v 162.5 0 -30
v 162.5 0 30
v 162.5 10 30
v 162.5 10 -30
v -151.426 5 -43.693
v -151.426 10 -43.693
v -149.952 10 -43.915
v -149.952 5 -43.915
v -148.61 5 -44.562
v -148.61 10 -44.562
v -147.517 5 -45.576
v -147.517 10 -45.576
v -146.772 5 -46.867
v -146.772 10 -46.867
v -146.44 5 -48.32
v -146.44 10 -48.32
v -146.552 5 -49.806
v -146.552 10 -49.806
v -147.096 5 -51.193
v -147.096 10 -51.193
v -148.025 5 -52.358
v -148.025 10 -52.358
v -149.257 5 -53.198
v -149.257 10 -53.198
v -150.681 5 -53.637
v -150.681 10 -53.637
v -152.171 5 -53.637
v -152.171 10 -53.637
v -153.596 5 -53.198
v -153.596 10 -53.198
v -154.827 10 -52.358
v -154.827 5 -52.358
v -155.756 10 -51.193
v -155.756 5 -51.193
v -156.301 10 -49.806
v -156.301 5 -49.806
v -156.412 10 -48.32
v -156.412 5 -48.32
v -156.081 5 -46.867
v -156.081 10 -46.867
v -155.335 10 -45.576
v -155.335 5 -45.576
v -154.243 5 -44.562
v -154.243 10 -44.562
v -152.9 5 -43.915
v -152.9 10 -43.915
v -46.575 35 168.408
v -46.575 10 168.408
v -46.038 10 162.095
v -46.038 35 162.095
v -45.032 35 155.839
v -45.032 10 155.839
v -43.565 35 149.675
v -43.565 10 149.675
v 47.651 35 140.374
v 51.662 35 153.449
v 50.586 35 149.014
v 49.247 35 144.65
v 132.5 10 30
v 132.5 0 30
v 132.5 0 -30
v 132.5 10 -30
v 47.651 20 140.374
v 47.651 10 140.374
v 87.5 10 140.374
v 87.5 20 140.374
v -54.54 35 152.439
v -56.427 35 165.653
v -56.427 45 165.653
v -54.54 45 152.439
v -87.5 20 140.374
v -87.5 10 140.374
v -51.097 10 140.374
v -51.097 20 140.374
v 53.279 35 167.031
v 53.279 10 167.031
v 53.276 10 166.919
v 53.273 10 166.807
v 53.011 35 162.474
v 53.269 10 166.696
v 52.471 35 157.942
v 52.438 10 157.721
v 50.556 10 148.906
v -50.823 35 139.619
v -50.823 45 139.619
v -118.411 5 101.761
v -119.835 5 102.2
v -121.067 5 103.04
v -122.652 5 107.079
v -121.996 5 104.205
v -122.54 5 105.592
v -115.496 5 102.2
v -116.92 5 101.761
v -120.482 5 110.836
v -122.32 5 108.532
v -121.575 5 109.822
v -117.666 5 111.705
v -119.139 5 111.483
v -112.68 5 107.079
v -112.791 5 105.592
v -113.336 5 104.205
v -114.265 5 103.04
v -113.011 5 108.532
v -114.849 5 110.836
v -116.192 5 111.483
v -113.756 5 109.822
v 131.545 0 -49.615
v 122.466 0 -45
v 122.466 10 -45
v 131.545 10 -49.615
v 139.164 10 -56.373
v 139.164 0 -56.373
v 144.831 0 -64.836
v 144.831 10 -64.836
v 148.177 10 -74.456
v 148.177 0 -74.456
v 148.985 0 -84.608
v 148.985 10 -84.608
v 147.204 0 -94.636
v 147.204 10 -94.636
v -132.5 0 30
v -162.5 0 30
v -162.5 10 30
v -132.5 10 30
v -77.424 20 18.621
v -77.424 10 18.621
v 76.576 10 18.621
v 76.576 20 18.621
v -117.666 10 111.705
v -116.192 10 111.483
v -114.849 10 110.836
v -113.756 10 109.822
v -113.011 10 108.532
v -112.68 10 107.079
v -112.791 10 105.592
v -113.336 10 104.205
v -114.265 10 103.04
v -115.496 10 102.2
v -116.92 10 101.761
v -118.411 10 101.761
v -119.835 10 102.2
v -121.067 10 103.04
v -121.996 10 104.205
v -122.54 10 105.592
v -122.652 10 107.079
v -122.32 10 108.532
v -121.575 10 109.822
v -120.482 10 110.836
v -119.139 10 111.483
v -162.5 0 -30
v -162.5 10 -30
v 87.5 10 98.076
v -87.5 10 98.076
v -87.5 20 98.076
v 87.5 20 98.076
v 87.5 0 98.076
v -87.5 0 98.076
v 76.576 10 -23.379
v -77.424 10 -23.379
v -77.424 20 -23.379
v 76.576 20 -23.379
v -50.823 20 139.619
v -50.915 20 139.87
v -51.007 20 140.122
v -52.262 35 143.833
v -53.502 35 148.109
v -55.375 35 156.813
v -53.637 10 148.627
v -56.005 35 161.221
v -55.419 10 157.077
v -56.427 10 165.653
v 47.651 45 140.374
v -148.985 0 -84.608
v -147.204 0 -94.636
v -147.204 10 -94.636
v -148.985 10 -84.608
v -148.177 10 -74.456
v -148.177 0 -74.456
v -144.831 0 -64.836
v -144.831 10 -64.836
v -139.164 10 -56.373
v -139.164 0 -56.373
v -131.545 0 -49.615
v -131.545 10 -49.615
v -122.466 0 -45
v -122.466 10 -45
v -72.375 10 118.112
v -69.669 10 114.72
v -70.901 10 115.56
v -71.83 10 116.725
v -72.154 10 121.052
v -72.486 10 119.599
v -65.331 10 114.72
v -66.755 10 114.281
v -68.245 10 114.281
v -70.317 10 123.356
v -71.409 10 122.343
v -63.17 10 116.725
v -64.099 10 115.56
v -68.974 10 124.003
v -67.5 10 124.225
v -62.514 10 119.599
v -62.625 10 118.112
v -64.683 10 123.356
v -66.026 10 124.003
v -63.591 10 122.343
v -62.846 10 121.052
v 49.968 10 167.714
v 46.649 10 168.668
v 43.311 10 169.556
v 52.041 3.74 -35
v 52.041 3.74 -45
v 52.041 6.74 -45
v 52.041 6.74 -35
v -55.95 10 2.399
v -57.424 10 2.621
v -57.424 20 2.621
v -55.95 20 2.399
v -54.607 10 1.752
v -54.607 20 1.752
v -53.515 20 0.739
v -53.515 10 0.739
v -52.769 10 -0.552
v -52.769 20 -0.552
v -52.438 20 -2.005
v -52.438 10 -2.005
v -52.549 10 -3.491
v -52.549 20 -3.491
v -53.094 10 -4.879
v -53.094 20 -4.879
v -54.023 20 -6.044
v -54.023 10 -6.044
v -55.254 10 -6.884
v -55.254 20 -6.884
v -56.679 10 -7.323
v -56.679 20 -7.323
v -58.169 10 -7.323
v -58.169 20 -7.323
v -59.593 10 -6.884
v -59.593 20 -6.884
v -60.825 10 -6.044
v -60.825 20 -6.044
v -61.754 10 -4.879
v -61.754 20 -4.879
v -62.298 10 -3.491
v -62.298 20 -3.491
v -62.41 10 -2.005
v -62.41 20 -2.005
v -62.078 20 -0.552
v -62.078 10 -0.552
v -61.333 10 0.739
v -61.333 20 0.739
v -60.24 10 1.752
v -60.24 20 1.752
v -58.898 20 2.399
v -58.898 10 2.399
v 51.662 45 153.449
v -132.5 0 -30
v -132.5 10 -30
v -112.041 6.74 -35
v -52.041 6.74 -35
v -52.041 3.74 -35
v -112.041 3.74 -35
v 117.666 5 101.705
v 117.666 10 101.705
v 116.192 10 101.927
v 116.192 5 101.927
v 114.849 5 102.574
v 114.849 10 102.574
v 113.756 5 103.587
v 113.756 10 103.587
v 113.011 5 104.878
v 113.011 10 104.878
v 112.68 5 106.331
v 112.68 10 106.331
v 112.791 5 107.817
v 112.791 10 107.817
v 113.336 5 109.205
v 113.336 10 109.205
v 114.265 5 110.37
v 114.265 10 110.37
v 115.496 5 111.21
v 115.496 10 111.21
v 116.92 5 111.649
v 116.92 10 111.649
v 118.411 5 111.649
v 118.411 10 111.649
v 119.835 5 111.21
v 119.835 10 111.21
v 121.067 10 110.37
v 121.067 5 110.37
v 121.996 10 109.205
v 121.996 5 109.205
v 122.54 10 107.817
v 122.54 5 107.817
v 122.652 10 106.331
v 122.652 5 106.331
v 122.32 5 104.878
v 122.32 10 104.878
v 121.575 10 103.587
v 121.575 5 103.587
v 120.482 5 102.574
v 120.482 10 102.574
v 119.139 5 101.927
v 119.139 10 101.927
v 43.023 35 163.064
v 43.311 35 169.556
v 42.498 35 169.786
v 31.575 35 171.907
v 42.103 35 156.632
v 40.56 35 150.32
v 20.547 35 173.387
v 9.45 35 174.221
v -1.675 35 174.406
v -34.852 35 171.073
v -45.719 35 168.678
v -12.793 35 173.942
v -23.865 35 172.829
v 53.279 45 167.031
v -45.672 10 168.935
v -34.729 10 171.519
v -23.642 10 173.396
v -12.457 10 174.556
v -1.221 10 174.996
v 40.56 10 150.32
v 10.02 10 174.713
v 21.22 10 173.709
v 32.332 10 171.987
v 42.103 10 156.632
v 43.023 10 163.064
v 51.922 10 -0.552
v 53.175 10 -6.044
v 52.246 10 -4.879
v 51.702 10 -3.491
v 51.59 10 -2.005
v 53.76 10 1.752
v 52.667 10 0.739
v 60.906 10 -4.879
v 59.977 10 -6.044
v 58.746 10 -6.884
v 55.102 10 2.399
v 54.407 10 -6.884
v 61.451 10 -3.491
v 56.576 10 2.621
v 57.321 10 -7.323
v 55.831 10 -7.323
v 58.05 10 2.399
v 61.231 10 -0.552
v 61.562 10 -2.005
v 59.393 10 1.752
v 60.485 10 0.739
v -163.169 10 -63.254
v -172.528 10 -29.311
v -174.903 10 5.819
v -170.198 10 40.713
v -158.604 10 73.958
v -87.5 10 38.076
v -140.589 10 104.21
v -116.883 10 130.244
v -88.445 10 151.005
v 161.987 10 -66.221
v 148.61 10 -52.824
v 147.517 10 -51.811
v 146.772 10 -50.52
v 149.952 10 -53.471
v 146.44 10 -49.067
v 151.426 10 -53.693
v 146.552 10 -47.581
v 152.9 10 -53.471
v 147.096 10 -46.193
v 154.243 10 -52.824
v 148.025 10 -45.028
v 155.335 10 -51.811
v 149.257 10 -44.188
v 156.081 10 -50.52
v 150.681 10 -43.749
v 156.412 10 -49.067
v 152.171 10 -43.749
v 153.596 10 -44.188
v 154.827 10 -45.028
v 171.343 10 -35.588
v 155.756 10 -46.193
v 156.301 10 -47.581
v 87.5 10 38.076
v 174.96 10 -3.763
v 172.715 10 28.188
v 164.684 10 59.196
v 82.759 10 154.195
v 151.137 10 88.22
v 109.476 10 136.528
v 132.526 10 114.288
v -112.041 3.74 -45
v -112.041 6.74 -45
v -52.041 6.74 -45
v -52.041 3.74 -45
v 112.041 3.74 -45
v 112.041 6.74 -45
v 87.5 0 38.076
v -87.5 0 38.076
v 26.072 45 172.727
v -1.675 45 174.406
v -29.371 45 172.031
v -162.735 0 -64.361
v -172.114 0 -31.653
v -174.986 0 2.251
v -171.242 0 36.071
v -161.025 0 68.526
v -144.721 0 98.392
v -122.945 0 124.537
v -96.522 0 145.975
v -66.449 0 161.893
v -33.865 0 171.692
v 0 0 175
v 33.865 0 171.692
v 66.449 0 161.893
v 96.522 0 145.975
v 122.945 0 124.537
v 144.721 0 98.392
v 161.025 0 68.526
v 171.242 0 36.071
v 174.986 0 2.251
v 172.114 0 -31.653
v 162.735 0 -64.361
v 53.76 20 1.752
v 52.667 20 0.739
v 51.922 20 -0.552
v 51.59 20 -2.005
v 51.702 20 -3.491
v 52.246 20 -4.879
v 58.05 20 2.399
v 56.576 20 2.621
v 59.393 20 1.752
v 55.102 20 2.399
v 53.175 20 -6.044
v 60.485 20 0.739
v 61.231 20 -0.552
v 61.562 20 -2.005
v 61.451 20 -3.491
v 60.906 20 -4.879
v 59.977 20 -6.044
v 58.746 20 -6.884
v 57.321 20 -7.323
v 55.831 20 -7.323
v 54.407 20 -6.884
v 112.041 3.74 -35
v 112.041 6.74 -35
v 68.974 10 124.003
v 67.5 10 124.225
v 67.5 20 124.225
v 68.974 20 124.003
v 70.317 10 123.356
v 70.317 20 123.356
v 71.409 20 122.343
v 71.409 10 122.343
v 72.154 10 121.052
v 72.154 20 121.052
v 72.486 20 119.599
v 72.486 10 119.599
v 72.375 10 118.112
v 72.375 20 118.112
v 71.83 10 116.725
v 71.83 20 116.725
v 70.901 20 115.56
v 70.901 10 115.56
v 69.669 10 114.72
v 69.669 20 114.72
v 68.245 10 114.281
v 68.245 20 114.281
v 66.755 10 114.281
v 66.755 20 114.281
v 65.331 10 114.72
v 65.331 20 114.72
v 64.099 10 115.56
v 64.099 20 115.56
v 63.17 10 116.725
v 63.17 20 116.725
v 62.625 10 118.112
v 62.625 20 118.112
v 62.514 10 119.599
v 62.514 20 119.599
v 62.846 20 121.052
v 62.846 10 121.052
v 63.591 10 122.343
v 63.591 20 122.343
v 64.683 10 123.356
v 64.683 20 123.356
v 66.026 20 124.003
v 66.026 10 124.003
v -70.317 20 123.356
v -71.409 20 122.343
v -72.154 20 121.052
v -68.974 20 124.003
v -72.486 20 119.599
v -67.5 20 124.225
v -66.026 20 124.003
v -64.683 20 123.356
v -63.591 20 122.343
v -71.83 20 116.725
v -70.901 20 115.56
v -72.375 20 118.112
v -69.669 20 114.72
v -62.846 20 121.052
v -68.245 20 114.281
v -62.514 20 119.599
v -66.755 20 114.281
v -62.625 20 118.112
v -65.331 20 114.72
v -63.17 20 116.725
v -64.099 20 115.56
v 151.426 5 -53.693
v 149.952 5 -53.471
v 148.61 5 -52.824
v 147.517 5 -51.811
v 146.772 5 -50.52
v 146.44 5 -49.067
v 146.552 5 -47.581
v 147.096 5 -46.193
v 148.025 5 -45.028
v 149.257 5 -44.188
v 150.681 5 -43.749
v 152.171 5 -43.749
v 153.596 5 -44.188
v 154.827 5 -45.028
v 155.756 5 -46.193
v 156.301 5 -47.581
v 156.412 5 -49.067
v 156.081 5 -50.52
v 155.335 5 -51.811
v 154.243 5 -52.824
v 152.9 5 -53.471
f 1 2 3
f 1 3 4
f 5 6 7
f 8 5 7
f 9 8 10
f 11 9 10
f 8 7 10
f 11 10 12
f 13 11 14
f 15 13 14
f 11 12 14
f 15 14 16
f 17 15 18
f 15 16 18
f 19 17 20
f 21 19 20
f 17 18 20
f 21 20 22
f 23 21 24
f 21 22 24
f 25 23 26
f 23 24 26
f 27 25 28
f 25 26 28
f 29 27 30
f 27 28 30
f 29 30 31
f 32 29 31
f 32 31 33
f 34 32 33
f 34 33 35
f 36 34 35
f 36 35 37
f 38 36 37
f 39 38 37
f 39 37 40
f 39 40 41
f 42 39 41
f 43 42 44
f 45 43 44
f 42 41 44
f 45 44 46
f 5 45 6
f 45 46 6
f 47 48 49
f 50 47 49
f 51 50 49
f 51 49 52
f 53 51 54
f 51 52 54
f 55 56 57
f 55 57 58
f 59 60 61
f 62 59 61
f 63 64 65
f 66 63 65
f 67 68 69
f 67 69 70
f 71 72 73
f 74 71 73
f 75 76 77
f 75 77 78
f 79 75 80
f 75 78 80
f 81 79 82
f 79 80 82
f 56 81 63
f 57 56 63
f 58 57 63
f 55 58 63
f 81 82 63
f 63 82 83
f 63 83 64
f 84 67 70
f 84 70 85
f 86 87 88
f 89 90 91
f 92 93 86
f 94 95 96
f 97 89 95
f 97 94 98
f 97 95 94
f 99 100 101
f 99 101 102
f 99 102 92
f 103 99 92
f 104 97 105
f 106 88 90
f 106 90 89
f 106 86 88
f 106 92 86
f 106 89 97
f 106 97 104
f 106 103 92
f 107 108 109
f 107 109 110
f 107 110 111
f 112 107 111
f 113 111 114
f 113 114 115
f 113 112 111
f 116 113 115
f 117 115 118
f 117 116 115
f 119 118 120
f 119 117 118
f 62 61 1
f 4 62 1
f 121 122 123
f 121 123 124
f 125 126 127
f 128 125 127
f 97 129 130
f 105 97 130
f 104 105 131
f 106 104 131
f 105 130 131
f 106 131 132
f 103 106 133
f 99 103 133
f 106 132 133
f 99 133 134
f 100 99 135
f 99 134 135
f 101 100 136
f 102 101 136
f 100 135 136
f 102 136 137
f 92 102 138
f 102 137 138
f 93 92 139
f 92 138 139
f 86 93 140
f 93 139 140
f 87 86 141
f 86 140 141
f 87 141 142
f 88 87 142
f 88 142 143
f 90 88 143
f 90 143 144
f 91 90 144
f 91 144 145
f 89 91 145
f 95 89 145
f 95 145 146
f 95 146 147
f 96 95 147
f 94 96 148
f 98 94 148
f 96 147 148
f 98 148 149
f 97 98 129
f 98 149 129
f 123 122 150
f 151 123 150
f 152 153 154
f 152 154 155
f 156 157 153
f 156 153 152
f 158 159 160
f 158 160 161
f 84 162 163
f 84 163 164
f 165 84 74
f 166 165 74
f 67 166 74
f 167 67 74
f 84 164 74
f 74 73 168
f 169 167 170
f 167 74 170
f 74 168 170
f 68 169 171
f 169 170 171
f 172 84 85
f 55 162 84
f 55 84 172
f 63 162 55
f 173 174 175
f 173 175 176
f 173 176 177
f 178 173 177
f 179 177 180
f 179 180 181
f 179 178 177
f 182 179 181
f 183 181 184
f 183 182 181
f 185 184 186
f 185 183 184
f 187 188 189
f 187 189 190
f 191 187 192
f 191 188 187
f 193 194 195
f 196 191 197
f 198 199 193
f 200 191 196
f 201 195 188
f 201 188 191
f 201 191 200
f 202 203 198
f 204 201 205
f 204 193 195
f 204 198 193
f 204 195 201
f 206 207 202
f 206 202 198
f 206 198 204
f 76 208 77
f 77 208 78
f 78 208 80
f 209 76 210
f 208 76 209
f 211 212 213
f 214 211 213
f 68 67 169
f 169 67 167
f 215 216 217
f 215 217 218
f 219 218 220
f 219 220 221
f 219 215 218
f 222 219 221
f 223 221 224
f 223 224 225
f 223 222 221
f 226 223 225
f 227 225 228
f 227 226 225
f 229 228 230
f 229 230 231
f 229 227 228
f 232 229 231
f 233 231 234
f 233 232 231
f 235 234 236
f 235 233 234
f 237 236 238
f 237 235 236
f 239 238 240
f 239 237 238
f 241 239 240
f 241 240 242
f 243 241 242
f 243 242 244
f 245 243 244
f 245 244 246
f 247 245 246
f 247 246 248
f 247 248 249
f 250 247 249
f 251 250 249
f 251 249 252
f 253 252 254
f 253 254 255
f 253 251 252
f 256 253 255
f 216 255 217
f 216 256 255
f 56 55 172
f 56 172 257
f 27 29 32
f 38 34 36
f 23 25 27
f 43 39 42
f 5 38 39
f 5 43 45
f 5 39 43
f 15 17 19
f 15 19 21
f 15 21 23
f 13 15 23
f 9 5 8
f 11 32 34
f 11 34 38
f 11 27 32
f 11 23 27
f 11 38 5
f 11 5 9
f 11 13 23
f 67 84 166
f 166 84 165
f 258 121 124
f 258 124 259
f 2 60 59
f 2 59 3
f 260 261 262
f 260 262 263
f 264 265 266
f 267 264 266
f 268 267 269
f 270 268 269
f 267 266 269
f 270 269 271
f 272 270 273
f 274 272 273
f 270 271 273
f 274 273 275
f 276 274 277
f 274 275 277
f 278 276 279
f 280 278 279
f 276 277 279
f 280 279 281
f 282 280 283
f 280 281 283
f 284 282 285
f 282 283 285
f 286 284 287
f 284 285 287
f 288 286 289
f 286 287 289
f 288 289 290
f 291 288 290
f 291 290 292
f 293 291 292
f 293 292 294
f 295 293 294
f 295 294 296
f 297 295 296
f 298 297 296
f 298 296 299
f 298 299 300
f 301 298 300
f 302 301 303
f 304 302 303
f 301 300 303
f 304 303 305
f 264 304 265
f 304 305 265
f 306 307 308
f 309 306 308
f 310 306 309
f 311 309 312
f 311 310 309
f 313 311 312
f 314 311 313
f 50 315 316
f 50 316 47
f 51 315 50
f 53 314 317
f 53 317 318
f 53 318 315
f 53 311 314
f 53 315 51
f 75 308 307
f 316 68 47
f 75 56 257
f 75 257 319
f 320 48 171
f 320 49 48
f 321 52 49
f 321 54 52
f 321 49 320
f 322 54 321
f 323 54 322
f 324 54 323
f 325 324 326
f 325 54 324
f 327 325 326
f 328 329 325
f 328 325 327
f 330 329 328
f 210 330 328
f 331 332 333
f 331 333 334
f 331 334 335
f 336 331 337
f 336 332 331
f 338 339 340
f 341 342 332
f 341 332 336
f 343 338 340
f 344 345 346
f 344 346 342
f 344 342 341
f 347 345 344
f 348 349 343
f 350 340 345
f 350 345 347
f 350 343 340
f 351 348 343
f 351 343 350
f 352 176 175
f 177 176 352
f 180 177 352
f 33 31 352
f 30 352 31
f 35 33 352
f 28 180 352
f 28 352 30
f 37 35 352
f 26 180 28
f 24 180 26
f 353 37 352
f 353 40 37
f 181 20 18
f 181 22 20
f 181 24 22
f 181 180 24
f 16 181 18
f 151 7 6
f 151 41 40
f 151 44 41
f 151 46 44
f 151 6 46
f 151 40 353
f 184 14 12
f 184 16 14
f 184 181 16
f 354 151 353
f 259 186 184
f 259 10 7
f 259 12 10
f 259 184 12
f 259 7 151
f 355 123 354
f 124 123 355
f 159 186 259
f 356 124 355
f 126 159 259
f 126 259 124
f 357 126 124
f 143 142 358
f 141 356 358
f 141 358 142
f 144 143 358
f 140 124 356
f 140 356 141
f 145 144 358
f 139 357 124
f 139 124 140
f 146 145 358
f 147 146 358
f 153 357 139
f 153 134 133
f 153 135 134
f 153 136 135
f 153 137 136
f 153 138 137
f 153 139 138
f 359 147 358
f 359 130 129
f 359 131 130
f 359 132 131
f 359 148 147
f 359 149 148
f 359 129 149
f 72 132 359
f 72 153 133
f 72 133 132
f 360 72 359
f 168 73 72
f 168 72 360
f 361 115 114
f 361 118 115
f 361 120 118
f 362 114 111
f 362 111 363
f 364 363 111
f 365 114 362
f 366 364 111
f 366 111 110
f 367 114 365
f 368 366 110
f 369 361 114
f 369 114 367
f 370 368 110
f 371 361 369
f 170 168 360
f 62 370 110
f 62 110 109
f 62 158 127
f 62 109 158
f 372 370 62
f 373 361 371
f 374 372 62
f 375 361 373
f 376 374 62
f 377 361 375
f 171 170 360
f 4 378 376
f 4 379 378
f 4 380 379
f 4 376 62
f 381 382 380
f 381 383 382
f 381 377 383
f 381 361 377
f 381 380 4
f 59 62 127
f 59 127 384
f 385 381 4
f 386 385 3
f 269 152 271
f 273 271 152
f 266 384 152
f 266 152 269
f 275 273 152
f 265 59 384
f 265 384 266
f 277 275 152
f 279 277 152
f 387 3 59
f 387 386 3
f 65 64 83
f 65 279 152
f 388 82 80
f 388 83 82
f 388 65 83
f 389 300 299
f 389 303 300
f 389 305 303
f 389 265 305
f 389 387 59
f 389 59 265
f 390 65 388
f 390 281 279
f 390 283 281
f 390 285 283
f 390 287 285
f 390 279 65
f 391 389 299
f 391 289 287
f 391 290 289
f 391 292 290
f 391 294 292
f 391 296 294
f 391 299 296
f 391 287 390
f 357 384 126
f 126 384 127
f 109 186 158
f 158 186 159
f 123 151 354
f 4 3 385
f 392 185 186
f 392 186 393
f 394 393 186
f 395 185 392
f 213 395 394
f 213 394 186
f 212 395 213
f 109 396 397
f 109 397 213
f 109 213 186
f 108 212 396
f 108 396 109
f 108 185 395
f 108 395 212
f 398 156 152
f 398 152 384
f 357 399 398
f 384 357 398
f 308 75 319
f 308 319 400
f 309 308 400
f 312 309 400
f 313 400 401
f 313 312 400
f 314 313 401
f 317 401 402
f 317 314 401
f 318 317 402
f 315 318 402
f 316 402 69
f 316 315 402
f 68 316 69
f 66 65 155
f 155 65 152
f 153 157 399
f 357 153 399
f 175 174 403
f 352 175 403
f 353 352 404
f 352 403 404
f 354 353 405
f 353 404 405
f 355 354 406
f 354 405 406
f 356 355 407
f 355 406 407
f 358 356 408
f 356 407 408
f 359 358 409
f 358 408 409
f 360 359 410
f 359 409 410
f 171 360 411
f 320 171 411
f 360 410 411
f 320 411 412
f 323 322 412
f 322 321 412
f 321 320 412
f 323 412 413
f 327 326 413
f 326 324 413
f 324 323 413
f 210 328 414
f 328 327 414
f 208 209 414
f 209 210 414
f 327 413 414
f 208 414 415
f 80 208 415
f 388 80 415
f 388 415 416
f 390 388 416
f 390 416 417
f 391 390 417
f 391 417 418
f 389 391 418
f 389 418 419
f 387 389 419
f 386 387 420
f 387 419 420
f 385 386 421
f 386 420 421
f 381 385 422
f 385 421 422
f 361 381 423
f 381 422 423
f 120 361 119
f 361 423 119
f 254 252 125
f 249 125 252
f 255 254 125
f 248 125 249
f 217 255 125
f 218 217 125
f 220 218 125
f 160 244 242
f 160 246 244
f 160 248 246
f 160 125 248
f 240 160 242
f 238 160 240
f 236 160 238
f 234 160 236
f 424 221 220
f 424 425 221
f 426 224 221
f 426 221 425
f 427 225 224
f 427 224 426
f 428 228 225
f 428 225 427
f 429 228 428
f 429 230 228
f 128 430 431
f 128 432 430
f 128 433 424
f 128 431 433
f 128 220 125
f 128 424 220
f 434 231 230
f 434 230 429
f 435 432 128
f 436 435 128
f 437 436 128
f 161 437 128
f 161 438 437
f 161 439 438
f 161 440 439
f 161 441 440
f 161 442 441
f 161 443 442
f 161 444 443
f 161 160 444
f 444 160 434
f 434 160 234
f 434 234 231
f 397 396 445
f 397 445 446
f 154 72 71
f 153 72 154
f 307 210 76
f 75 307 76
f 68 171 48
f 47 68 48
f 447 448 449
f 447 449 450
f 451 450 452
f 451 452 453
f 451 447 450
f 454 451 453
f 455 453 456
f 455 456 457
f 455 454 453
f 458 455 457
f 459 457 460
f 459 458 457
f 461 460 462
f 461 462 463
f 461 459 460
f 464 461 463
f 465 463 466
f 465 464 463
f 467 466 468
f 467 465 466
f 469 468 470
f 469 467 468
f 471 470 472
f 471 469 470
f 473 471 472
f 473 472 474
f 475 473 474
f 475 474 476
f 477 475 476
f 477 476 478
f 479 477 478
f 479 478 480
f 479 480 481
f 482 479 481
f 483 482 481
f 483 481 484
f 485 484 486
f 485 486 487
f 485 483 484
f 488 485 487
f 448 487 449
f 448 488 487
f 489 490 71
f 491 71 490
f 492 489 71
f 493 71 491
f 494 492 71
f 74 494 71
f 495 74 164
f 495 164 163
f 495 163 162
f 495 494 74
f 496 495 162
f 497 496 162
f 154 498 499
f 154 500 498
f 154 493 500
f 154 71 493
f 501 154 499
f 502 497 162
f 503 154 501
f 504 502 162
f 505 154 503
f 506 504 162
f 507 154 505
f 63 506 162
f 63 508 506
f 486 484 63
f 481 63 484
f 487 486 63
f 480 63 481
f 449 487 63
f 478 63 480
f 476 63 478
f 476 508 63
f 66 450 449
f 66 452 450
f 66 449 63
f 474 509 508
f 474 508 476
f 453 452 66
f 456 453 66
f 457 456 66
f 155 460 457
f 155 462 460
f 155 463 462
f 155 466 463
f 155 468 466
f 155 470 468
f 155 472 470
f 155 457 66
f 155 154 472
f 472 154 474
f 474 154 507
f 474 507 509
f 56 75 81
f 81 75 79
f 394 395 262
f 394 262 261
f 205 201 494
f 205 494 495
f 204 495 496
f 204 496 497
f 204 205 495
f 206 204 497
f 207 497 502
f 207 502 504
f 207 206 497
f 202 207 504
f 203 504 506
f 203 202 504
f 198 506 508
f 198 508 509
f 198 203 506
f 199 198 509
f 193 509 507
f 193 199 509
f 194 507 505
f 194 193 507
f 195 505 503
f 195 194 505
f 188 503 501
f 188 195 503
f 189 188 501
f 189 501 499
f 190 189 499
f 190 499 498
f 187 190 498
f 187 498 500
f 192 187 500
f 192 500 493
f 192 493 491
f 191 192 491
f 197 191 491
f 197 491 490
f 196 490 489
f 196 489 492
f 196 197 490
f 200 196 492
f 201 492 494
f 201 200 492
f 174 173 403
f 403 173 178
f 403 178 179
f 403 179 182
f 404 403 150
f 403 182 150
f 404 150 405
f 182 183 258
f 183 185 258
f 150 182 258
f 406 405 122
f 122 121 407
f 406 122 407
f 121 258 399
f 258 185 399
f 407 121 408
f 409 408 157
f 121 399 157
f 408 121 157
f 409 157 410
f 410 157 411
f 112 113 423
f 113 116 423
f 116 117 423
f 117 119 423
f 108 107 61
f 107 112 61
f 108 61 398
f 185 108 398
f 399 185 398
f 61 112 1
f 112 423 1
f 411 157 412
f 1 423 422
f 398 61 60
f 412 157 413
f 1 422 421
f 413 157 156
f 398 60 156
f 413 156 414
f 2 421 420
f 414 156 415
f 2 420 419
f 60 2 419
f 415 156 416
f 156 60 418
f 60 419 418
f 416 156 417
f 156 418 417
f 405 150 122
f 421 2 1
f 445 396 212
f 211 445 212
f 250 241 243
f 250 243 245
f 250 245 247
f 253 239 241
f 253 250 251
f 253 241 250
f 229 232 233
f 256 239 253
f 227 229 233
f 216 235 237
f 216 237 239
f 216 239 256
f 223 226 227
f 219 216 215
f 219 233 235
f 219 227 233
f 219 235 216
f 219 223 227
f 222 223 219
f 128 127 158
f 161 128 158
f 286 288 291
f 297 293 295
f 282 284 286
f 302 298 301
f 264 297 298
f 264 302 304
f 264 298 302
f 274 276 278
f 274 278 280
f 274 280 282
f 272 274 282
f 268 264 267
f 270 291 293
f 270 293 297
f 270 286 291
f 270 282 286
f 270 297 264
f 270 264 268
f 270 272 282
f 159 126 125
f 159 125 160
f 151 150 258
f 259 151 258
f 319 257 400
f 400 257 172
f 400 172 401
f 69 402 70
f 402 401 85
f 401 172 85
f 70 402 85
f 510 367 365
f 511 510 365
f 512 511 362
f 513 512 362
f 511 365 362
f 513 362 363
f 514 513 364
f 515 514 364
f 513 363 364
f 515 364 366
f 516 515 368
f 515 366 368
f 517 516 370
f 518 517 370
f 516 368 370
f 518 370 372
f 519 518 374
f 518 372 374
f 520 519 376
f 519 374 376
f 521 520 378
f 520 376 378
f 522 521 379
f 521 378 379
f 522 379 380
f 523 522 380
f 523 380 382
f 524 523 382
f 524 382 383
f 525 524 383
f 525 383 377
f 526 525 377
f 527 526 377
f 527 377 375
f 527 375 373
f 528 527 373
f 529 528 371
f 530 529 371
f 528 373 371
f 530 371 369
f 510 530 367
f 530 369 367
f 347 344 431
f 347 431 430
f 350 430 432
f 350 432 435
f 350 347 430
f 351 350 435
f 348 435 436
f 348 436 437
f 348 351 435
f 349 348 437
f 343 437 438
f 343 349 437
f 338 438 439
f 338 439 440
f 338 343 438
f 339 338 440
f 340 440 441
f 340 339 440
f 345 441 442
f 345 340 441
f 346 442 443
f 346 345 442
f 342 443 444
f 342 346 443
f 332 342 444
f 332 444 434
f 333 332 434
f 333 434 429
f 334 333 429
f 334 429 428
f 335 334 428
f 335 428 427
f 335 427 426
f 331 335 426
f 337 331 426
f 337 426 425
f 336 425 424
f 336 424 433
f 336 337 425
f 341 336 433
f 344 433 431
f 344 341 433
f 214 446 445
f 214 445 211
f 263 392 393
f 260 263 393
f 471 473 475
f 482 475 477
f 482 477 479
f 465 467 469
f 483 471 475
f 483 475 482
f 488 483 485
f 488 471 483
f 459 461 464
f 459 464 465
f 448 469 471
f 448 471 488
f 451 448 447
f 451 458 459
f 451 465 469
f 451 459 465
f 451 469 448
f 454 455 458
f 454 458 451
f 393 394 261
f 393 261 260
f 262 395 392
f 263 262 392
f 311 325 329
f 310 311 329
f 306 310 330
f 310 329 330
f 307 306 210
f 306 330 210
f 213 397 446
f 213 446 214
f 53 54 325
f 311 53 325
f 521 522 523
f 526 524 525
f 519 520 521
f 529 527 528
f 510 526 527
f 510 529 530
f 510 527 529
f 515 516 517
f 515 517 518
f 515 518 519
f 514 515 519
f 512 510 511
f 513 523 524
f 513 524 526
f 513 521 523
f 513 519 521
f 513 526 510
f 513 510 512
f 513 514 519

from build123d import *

# Parameters (mm, degrees)
BASEDIA_R           = 175
BOSS_EXTRUDE1_DEPTH = 10
SKETCH2_W           = 175
SKETCH2_H           = 60
CUT_EXTRUDE3_DEPTH  = 10
CUT_EXTRUDE5_START  = -10
SKETCH5_W           = 30
SKETCH5_H           = 60
CUT_EXTRUDE5_DEPTH  = 10
BOSS_EXTRUDE2_DEPTH = 25
SKETCH8_W           = 175
SKETCH8_H           = 42.297309852
SKETCH8_R           = 5
BOSS_EXTRUDE3_DEPTH = 10
SKETCH9_W           = 154
SKETCH9_H           = 42
SKETCH9_R           = 5
BOSS_EXTRUDE4_DEPTH = 10
SKETCH10_R          = 5
CUT_EXTRUDE6_DEPTH  = 5
SKETCH11_W          = 60
SKETCH11_H          = 3
CUT_EXTRUDE7_DEPTH  = 10
BOSS_EXTRUDE5_DEPTH = 10


with BuildPart() as part:
    # basedia → Boss-Extrude1 (new body)
    with BuildSketch(Plane(origin=(0, 0, 0), x_dir=(1, 0, 0), z_dir=(0, 1, 0))):
        with Locations(Location((0, 0, 0), (0, 0, 270))):
            Circle(BASEDIA_R)
    extrude(amount=BOSS_EXTRUDE1_DEPTH)

    # Sketch2 → Cut-Extrude3 (cut)
    with BuildSketch(Plane(origin=(0, 0, 0), x_dir=(1, 0, 0), z_dir=(0, 1, 0))):
        with Locations((0, -68.076429651)):
            Rectangle(SKETCH2_W, SKETCH2_H)
    extrude(amount=CUT_EXTRUDE3_DEPTH, mode=Mode.SUBTRACT)

    # Sketch5 → Cut-Extrude5 (cut)
    with BuildSketch(Plane(origin=(0, 10, 0), x_dir=(1, 0, 0), z_dir=(0, 1, 0)).offset(CUT_EXTRUDE5_START)):
        with BuildLine():
            Line((-122.466018466, 45), (122.466018466, 45))
            ThreePointArc((122.466018466, 45), (144.830685243, 64.836208714), (147.204111427, 94.63587892))
            ThreePointArc((147.204111427, 94.63587892), (0, 175), (-147.204111427, 94.63587892))
            ThreePointArc((-147.204111427, 94.63587892), (-144.830685243, 64.836208714), (-122.466018466, 45))
        make_face()
        with Locations((-147.5, 0)):
            Rectangle(SKETCH5_W, SKETCH5_H)
        with Locations((147.5, 0)):
            Rectangle(SKETCH5_W, SKETCH5_H)
    extrude(amount=CUT_EXTRUDE5_DEPTH, mode=Mode.SUBTRACT)

    # Sketch7 → Boss-Extrude2 (add)
    with BuildSketch(Plane(origin=(0, 10, 0), x_dir=(1, 0, 0), z_dir=(0, 1, 0))):
        with BuildLine():
            Line((-43.56510526, -149.674915049), (40.559642833, -150.319684554))
            ThreePointArc((40.559642833, -150.319684554), (42.642034938, -159.836675376), (43.310651761, -169.555853464))
            Line((43.310651761, -169.555853464), (53.279307238, -167.030646365))
            ThreePointArc((53.279307238, -167.030646365), (51.661940371, -153.449452713), (47.650653713, -140.373739503))
            Line((47.650653713, -140.373739503), (-50.823489188, -139.61898985))
            ThreePointArc((-50.823489188, -139.61898985), (-54.540052947, -152.439162742), (-56.427487426, -165.65306717))
            Line((-56.427487426, -165.65306717), (-46.575152469, -168.40822556))
            ThreePointArc((-46.575152469, -168.40822556), (-45.593073163, -158.957544204), (-43.56510526, -149.674915049))
        make_face()
    extrude(amount=BOSS_EXTRUDE2_DEPTH)

    # Sketch8 → Boss-Extrude3 (add)
    with BuildSketch(Plane(origin=(0, 10, 0), x_dir=(1, 0, 0), z_dir=(0, 1, 0))):
        with Locations((0, -119.225084577)):
            Rectangle(SKETCH8_W, SKETCH8_H)
        with Locations(Location((-67.5, -119.225084577, 0), (0, 0, 270))):
            Circle(SKETCH8_R, mode=Mode.SUBTRACT)
        with Locations(Location((67.5, -119.225084577, 0), (0, 0, 270))):
            Circle(SKETCH8_R, mode=Mode.SUBTRACT)
    extrude(amount=BOSS_EXTRUDE3_DEPTH)

    # Sketch9 → Boss-Extrude4 (add)
    with BuildSketch(Plane(origin=(0, 10, 0), x_dir=(1, 0, 0), z_dir=(0, 1, 0))):
        with Locations((-0.423800225, 2.37885536)):
            Rectangle(SKETCH9_W, SKETCH9_H)
        with Locations(Location((-57.423800225, 2.37885536, 0), (0, 0, 270))):
            Circle(SKETCH9_R, mode=Mode.SUBTRACT)
        with Locations(Location((56.576199775, 2.37885536, 0), (0, 0, 270))):
            Circle(SKETCH9_R, mode=Mode.SUBTRACT)
    extrude(amount=BOSS_EXTRUDE4_DEPTH)

    # Sketch10 → Cut-Extrude6 (cut)
    with BuildSketch(Plane(origin=(0, 10, 0), x_dir=(1, 0, 0), z_dir=(0, 1, 0))):
        with Locations(Location((-117.665653332, -106.704862813, 0), (0, 0, 270))):
            Circle(SKETCH10_R)
        with Locations(Location((-151.426262726, 48.693236313, 0), (0, 0, 270))):
            Circle(SKETCH10_R)
        with Locations(Location((151.426262726, 48.693236313, 0), (0, 0, 90))):
            Circle(SKETCH10_R)
        with Locations(Location((117.665653332, -106.704862813, 0), (0, 0, 90))):
            Circle(SKETCH10_R)
    extrude(amount=-CUT_EXTRUDE6_DEPTH, mode=Mode.SUBTRACT)

    # Sketch11 → Cut-Extrude7 (cut)
    with BuildSketch(Plane(origin=(0, 0, -45), x_dir=(-1, 0, 0), z_dir=(0, 0, -1))):
        with Locations((-82.041456067, 5.240211955)):
            Rectangle(SKETCH11_W, SKETCH11_H)
        with Locations((82.041456067, 5.240211955)):
            Rectangle(SKETCH11_W, SKETCH11_H)
    extrude(amount=-CUT_EXTRUDE7_DEPTH, mode=Mode.SUBTRACT)

    # Sketch12 → Boss-Extrude5 (add)
    with BuildSketch(Plane(origin=(0, 35, 0), x_dir=(1, 0, 0), z_dir=(0, 1, 0))):
        with BuildLine():
            Line((-50.823489188, -139.61898985), (47.650653713, -140.373739503))
            Line((47.650653713, -140.373739503), (51.661940371, -153.449452713))
            Line((51.661940371, -153.449452713), (53.279307238, -167.030646365))
            ThreePointArc((53.279307238, -167.030646365), (-1.675350263, -174.405951078), (-56.427487426, -165.65306717))
            Line((-56.427487426, -165.65306717), (-54.540052947, -152.439162742))
            Line((-54.540052947, -152.439162742), (-50.823489188, -139.61898985))
        make_face()
    extrude(amount=BOSS_EXTRUDE5_DEPTH)


solid = part.part
